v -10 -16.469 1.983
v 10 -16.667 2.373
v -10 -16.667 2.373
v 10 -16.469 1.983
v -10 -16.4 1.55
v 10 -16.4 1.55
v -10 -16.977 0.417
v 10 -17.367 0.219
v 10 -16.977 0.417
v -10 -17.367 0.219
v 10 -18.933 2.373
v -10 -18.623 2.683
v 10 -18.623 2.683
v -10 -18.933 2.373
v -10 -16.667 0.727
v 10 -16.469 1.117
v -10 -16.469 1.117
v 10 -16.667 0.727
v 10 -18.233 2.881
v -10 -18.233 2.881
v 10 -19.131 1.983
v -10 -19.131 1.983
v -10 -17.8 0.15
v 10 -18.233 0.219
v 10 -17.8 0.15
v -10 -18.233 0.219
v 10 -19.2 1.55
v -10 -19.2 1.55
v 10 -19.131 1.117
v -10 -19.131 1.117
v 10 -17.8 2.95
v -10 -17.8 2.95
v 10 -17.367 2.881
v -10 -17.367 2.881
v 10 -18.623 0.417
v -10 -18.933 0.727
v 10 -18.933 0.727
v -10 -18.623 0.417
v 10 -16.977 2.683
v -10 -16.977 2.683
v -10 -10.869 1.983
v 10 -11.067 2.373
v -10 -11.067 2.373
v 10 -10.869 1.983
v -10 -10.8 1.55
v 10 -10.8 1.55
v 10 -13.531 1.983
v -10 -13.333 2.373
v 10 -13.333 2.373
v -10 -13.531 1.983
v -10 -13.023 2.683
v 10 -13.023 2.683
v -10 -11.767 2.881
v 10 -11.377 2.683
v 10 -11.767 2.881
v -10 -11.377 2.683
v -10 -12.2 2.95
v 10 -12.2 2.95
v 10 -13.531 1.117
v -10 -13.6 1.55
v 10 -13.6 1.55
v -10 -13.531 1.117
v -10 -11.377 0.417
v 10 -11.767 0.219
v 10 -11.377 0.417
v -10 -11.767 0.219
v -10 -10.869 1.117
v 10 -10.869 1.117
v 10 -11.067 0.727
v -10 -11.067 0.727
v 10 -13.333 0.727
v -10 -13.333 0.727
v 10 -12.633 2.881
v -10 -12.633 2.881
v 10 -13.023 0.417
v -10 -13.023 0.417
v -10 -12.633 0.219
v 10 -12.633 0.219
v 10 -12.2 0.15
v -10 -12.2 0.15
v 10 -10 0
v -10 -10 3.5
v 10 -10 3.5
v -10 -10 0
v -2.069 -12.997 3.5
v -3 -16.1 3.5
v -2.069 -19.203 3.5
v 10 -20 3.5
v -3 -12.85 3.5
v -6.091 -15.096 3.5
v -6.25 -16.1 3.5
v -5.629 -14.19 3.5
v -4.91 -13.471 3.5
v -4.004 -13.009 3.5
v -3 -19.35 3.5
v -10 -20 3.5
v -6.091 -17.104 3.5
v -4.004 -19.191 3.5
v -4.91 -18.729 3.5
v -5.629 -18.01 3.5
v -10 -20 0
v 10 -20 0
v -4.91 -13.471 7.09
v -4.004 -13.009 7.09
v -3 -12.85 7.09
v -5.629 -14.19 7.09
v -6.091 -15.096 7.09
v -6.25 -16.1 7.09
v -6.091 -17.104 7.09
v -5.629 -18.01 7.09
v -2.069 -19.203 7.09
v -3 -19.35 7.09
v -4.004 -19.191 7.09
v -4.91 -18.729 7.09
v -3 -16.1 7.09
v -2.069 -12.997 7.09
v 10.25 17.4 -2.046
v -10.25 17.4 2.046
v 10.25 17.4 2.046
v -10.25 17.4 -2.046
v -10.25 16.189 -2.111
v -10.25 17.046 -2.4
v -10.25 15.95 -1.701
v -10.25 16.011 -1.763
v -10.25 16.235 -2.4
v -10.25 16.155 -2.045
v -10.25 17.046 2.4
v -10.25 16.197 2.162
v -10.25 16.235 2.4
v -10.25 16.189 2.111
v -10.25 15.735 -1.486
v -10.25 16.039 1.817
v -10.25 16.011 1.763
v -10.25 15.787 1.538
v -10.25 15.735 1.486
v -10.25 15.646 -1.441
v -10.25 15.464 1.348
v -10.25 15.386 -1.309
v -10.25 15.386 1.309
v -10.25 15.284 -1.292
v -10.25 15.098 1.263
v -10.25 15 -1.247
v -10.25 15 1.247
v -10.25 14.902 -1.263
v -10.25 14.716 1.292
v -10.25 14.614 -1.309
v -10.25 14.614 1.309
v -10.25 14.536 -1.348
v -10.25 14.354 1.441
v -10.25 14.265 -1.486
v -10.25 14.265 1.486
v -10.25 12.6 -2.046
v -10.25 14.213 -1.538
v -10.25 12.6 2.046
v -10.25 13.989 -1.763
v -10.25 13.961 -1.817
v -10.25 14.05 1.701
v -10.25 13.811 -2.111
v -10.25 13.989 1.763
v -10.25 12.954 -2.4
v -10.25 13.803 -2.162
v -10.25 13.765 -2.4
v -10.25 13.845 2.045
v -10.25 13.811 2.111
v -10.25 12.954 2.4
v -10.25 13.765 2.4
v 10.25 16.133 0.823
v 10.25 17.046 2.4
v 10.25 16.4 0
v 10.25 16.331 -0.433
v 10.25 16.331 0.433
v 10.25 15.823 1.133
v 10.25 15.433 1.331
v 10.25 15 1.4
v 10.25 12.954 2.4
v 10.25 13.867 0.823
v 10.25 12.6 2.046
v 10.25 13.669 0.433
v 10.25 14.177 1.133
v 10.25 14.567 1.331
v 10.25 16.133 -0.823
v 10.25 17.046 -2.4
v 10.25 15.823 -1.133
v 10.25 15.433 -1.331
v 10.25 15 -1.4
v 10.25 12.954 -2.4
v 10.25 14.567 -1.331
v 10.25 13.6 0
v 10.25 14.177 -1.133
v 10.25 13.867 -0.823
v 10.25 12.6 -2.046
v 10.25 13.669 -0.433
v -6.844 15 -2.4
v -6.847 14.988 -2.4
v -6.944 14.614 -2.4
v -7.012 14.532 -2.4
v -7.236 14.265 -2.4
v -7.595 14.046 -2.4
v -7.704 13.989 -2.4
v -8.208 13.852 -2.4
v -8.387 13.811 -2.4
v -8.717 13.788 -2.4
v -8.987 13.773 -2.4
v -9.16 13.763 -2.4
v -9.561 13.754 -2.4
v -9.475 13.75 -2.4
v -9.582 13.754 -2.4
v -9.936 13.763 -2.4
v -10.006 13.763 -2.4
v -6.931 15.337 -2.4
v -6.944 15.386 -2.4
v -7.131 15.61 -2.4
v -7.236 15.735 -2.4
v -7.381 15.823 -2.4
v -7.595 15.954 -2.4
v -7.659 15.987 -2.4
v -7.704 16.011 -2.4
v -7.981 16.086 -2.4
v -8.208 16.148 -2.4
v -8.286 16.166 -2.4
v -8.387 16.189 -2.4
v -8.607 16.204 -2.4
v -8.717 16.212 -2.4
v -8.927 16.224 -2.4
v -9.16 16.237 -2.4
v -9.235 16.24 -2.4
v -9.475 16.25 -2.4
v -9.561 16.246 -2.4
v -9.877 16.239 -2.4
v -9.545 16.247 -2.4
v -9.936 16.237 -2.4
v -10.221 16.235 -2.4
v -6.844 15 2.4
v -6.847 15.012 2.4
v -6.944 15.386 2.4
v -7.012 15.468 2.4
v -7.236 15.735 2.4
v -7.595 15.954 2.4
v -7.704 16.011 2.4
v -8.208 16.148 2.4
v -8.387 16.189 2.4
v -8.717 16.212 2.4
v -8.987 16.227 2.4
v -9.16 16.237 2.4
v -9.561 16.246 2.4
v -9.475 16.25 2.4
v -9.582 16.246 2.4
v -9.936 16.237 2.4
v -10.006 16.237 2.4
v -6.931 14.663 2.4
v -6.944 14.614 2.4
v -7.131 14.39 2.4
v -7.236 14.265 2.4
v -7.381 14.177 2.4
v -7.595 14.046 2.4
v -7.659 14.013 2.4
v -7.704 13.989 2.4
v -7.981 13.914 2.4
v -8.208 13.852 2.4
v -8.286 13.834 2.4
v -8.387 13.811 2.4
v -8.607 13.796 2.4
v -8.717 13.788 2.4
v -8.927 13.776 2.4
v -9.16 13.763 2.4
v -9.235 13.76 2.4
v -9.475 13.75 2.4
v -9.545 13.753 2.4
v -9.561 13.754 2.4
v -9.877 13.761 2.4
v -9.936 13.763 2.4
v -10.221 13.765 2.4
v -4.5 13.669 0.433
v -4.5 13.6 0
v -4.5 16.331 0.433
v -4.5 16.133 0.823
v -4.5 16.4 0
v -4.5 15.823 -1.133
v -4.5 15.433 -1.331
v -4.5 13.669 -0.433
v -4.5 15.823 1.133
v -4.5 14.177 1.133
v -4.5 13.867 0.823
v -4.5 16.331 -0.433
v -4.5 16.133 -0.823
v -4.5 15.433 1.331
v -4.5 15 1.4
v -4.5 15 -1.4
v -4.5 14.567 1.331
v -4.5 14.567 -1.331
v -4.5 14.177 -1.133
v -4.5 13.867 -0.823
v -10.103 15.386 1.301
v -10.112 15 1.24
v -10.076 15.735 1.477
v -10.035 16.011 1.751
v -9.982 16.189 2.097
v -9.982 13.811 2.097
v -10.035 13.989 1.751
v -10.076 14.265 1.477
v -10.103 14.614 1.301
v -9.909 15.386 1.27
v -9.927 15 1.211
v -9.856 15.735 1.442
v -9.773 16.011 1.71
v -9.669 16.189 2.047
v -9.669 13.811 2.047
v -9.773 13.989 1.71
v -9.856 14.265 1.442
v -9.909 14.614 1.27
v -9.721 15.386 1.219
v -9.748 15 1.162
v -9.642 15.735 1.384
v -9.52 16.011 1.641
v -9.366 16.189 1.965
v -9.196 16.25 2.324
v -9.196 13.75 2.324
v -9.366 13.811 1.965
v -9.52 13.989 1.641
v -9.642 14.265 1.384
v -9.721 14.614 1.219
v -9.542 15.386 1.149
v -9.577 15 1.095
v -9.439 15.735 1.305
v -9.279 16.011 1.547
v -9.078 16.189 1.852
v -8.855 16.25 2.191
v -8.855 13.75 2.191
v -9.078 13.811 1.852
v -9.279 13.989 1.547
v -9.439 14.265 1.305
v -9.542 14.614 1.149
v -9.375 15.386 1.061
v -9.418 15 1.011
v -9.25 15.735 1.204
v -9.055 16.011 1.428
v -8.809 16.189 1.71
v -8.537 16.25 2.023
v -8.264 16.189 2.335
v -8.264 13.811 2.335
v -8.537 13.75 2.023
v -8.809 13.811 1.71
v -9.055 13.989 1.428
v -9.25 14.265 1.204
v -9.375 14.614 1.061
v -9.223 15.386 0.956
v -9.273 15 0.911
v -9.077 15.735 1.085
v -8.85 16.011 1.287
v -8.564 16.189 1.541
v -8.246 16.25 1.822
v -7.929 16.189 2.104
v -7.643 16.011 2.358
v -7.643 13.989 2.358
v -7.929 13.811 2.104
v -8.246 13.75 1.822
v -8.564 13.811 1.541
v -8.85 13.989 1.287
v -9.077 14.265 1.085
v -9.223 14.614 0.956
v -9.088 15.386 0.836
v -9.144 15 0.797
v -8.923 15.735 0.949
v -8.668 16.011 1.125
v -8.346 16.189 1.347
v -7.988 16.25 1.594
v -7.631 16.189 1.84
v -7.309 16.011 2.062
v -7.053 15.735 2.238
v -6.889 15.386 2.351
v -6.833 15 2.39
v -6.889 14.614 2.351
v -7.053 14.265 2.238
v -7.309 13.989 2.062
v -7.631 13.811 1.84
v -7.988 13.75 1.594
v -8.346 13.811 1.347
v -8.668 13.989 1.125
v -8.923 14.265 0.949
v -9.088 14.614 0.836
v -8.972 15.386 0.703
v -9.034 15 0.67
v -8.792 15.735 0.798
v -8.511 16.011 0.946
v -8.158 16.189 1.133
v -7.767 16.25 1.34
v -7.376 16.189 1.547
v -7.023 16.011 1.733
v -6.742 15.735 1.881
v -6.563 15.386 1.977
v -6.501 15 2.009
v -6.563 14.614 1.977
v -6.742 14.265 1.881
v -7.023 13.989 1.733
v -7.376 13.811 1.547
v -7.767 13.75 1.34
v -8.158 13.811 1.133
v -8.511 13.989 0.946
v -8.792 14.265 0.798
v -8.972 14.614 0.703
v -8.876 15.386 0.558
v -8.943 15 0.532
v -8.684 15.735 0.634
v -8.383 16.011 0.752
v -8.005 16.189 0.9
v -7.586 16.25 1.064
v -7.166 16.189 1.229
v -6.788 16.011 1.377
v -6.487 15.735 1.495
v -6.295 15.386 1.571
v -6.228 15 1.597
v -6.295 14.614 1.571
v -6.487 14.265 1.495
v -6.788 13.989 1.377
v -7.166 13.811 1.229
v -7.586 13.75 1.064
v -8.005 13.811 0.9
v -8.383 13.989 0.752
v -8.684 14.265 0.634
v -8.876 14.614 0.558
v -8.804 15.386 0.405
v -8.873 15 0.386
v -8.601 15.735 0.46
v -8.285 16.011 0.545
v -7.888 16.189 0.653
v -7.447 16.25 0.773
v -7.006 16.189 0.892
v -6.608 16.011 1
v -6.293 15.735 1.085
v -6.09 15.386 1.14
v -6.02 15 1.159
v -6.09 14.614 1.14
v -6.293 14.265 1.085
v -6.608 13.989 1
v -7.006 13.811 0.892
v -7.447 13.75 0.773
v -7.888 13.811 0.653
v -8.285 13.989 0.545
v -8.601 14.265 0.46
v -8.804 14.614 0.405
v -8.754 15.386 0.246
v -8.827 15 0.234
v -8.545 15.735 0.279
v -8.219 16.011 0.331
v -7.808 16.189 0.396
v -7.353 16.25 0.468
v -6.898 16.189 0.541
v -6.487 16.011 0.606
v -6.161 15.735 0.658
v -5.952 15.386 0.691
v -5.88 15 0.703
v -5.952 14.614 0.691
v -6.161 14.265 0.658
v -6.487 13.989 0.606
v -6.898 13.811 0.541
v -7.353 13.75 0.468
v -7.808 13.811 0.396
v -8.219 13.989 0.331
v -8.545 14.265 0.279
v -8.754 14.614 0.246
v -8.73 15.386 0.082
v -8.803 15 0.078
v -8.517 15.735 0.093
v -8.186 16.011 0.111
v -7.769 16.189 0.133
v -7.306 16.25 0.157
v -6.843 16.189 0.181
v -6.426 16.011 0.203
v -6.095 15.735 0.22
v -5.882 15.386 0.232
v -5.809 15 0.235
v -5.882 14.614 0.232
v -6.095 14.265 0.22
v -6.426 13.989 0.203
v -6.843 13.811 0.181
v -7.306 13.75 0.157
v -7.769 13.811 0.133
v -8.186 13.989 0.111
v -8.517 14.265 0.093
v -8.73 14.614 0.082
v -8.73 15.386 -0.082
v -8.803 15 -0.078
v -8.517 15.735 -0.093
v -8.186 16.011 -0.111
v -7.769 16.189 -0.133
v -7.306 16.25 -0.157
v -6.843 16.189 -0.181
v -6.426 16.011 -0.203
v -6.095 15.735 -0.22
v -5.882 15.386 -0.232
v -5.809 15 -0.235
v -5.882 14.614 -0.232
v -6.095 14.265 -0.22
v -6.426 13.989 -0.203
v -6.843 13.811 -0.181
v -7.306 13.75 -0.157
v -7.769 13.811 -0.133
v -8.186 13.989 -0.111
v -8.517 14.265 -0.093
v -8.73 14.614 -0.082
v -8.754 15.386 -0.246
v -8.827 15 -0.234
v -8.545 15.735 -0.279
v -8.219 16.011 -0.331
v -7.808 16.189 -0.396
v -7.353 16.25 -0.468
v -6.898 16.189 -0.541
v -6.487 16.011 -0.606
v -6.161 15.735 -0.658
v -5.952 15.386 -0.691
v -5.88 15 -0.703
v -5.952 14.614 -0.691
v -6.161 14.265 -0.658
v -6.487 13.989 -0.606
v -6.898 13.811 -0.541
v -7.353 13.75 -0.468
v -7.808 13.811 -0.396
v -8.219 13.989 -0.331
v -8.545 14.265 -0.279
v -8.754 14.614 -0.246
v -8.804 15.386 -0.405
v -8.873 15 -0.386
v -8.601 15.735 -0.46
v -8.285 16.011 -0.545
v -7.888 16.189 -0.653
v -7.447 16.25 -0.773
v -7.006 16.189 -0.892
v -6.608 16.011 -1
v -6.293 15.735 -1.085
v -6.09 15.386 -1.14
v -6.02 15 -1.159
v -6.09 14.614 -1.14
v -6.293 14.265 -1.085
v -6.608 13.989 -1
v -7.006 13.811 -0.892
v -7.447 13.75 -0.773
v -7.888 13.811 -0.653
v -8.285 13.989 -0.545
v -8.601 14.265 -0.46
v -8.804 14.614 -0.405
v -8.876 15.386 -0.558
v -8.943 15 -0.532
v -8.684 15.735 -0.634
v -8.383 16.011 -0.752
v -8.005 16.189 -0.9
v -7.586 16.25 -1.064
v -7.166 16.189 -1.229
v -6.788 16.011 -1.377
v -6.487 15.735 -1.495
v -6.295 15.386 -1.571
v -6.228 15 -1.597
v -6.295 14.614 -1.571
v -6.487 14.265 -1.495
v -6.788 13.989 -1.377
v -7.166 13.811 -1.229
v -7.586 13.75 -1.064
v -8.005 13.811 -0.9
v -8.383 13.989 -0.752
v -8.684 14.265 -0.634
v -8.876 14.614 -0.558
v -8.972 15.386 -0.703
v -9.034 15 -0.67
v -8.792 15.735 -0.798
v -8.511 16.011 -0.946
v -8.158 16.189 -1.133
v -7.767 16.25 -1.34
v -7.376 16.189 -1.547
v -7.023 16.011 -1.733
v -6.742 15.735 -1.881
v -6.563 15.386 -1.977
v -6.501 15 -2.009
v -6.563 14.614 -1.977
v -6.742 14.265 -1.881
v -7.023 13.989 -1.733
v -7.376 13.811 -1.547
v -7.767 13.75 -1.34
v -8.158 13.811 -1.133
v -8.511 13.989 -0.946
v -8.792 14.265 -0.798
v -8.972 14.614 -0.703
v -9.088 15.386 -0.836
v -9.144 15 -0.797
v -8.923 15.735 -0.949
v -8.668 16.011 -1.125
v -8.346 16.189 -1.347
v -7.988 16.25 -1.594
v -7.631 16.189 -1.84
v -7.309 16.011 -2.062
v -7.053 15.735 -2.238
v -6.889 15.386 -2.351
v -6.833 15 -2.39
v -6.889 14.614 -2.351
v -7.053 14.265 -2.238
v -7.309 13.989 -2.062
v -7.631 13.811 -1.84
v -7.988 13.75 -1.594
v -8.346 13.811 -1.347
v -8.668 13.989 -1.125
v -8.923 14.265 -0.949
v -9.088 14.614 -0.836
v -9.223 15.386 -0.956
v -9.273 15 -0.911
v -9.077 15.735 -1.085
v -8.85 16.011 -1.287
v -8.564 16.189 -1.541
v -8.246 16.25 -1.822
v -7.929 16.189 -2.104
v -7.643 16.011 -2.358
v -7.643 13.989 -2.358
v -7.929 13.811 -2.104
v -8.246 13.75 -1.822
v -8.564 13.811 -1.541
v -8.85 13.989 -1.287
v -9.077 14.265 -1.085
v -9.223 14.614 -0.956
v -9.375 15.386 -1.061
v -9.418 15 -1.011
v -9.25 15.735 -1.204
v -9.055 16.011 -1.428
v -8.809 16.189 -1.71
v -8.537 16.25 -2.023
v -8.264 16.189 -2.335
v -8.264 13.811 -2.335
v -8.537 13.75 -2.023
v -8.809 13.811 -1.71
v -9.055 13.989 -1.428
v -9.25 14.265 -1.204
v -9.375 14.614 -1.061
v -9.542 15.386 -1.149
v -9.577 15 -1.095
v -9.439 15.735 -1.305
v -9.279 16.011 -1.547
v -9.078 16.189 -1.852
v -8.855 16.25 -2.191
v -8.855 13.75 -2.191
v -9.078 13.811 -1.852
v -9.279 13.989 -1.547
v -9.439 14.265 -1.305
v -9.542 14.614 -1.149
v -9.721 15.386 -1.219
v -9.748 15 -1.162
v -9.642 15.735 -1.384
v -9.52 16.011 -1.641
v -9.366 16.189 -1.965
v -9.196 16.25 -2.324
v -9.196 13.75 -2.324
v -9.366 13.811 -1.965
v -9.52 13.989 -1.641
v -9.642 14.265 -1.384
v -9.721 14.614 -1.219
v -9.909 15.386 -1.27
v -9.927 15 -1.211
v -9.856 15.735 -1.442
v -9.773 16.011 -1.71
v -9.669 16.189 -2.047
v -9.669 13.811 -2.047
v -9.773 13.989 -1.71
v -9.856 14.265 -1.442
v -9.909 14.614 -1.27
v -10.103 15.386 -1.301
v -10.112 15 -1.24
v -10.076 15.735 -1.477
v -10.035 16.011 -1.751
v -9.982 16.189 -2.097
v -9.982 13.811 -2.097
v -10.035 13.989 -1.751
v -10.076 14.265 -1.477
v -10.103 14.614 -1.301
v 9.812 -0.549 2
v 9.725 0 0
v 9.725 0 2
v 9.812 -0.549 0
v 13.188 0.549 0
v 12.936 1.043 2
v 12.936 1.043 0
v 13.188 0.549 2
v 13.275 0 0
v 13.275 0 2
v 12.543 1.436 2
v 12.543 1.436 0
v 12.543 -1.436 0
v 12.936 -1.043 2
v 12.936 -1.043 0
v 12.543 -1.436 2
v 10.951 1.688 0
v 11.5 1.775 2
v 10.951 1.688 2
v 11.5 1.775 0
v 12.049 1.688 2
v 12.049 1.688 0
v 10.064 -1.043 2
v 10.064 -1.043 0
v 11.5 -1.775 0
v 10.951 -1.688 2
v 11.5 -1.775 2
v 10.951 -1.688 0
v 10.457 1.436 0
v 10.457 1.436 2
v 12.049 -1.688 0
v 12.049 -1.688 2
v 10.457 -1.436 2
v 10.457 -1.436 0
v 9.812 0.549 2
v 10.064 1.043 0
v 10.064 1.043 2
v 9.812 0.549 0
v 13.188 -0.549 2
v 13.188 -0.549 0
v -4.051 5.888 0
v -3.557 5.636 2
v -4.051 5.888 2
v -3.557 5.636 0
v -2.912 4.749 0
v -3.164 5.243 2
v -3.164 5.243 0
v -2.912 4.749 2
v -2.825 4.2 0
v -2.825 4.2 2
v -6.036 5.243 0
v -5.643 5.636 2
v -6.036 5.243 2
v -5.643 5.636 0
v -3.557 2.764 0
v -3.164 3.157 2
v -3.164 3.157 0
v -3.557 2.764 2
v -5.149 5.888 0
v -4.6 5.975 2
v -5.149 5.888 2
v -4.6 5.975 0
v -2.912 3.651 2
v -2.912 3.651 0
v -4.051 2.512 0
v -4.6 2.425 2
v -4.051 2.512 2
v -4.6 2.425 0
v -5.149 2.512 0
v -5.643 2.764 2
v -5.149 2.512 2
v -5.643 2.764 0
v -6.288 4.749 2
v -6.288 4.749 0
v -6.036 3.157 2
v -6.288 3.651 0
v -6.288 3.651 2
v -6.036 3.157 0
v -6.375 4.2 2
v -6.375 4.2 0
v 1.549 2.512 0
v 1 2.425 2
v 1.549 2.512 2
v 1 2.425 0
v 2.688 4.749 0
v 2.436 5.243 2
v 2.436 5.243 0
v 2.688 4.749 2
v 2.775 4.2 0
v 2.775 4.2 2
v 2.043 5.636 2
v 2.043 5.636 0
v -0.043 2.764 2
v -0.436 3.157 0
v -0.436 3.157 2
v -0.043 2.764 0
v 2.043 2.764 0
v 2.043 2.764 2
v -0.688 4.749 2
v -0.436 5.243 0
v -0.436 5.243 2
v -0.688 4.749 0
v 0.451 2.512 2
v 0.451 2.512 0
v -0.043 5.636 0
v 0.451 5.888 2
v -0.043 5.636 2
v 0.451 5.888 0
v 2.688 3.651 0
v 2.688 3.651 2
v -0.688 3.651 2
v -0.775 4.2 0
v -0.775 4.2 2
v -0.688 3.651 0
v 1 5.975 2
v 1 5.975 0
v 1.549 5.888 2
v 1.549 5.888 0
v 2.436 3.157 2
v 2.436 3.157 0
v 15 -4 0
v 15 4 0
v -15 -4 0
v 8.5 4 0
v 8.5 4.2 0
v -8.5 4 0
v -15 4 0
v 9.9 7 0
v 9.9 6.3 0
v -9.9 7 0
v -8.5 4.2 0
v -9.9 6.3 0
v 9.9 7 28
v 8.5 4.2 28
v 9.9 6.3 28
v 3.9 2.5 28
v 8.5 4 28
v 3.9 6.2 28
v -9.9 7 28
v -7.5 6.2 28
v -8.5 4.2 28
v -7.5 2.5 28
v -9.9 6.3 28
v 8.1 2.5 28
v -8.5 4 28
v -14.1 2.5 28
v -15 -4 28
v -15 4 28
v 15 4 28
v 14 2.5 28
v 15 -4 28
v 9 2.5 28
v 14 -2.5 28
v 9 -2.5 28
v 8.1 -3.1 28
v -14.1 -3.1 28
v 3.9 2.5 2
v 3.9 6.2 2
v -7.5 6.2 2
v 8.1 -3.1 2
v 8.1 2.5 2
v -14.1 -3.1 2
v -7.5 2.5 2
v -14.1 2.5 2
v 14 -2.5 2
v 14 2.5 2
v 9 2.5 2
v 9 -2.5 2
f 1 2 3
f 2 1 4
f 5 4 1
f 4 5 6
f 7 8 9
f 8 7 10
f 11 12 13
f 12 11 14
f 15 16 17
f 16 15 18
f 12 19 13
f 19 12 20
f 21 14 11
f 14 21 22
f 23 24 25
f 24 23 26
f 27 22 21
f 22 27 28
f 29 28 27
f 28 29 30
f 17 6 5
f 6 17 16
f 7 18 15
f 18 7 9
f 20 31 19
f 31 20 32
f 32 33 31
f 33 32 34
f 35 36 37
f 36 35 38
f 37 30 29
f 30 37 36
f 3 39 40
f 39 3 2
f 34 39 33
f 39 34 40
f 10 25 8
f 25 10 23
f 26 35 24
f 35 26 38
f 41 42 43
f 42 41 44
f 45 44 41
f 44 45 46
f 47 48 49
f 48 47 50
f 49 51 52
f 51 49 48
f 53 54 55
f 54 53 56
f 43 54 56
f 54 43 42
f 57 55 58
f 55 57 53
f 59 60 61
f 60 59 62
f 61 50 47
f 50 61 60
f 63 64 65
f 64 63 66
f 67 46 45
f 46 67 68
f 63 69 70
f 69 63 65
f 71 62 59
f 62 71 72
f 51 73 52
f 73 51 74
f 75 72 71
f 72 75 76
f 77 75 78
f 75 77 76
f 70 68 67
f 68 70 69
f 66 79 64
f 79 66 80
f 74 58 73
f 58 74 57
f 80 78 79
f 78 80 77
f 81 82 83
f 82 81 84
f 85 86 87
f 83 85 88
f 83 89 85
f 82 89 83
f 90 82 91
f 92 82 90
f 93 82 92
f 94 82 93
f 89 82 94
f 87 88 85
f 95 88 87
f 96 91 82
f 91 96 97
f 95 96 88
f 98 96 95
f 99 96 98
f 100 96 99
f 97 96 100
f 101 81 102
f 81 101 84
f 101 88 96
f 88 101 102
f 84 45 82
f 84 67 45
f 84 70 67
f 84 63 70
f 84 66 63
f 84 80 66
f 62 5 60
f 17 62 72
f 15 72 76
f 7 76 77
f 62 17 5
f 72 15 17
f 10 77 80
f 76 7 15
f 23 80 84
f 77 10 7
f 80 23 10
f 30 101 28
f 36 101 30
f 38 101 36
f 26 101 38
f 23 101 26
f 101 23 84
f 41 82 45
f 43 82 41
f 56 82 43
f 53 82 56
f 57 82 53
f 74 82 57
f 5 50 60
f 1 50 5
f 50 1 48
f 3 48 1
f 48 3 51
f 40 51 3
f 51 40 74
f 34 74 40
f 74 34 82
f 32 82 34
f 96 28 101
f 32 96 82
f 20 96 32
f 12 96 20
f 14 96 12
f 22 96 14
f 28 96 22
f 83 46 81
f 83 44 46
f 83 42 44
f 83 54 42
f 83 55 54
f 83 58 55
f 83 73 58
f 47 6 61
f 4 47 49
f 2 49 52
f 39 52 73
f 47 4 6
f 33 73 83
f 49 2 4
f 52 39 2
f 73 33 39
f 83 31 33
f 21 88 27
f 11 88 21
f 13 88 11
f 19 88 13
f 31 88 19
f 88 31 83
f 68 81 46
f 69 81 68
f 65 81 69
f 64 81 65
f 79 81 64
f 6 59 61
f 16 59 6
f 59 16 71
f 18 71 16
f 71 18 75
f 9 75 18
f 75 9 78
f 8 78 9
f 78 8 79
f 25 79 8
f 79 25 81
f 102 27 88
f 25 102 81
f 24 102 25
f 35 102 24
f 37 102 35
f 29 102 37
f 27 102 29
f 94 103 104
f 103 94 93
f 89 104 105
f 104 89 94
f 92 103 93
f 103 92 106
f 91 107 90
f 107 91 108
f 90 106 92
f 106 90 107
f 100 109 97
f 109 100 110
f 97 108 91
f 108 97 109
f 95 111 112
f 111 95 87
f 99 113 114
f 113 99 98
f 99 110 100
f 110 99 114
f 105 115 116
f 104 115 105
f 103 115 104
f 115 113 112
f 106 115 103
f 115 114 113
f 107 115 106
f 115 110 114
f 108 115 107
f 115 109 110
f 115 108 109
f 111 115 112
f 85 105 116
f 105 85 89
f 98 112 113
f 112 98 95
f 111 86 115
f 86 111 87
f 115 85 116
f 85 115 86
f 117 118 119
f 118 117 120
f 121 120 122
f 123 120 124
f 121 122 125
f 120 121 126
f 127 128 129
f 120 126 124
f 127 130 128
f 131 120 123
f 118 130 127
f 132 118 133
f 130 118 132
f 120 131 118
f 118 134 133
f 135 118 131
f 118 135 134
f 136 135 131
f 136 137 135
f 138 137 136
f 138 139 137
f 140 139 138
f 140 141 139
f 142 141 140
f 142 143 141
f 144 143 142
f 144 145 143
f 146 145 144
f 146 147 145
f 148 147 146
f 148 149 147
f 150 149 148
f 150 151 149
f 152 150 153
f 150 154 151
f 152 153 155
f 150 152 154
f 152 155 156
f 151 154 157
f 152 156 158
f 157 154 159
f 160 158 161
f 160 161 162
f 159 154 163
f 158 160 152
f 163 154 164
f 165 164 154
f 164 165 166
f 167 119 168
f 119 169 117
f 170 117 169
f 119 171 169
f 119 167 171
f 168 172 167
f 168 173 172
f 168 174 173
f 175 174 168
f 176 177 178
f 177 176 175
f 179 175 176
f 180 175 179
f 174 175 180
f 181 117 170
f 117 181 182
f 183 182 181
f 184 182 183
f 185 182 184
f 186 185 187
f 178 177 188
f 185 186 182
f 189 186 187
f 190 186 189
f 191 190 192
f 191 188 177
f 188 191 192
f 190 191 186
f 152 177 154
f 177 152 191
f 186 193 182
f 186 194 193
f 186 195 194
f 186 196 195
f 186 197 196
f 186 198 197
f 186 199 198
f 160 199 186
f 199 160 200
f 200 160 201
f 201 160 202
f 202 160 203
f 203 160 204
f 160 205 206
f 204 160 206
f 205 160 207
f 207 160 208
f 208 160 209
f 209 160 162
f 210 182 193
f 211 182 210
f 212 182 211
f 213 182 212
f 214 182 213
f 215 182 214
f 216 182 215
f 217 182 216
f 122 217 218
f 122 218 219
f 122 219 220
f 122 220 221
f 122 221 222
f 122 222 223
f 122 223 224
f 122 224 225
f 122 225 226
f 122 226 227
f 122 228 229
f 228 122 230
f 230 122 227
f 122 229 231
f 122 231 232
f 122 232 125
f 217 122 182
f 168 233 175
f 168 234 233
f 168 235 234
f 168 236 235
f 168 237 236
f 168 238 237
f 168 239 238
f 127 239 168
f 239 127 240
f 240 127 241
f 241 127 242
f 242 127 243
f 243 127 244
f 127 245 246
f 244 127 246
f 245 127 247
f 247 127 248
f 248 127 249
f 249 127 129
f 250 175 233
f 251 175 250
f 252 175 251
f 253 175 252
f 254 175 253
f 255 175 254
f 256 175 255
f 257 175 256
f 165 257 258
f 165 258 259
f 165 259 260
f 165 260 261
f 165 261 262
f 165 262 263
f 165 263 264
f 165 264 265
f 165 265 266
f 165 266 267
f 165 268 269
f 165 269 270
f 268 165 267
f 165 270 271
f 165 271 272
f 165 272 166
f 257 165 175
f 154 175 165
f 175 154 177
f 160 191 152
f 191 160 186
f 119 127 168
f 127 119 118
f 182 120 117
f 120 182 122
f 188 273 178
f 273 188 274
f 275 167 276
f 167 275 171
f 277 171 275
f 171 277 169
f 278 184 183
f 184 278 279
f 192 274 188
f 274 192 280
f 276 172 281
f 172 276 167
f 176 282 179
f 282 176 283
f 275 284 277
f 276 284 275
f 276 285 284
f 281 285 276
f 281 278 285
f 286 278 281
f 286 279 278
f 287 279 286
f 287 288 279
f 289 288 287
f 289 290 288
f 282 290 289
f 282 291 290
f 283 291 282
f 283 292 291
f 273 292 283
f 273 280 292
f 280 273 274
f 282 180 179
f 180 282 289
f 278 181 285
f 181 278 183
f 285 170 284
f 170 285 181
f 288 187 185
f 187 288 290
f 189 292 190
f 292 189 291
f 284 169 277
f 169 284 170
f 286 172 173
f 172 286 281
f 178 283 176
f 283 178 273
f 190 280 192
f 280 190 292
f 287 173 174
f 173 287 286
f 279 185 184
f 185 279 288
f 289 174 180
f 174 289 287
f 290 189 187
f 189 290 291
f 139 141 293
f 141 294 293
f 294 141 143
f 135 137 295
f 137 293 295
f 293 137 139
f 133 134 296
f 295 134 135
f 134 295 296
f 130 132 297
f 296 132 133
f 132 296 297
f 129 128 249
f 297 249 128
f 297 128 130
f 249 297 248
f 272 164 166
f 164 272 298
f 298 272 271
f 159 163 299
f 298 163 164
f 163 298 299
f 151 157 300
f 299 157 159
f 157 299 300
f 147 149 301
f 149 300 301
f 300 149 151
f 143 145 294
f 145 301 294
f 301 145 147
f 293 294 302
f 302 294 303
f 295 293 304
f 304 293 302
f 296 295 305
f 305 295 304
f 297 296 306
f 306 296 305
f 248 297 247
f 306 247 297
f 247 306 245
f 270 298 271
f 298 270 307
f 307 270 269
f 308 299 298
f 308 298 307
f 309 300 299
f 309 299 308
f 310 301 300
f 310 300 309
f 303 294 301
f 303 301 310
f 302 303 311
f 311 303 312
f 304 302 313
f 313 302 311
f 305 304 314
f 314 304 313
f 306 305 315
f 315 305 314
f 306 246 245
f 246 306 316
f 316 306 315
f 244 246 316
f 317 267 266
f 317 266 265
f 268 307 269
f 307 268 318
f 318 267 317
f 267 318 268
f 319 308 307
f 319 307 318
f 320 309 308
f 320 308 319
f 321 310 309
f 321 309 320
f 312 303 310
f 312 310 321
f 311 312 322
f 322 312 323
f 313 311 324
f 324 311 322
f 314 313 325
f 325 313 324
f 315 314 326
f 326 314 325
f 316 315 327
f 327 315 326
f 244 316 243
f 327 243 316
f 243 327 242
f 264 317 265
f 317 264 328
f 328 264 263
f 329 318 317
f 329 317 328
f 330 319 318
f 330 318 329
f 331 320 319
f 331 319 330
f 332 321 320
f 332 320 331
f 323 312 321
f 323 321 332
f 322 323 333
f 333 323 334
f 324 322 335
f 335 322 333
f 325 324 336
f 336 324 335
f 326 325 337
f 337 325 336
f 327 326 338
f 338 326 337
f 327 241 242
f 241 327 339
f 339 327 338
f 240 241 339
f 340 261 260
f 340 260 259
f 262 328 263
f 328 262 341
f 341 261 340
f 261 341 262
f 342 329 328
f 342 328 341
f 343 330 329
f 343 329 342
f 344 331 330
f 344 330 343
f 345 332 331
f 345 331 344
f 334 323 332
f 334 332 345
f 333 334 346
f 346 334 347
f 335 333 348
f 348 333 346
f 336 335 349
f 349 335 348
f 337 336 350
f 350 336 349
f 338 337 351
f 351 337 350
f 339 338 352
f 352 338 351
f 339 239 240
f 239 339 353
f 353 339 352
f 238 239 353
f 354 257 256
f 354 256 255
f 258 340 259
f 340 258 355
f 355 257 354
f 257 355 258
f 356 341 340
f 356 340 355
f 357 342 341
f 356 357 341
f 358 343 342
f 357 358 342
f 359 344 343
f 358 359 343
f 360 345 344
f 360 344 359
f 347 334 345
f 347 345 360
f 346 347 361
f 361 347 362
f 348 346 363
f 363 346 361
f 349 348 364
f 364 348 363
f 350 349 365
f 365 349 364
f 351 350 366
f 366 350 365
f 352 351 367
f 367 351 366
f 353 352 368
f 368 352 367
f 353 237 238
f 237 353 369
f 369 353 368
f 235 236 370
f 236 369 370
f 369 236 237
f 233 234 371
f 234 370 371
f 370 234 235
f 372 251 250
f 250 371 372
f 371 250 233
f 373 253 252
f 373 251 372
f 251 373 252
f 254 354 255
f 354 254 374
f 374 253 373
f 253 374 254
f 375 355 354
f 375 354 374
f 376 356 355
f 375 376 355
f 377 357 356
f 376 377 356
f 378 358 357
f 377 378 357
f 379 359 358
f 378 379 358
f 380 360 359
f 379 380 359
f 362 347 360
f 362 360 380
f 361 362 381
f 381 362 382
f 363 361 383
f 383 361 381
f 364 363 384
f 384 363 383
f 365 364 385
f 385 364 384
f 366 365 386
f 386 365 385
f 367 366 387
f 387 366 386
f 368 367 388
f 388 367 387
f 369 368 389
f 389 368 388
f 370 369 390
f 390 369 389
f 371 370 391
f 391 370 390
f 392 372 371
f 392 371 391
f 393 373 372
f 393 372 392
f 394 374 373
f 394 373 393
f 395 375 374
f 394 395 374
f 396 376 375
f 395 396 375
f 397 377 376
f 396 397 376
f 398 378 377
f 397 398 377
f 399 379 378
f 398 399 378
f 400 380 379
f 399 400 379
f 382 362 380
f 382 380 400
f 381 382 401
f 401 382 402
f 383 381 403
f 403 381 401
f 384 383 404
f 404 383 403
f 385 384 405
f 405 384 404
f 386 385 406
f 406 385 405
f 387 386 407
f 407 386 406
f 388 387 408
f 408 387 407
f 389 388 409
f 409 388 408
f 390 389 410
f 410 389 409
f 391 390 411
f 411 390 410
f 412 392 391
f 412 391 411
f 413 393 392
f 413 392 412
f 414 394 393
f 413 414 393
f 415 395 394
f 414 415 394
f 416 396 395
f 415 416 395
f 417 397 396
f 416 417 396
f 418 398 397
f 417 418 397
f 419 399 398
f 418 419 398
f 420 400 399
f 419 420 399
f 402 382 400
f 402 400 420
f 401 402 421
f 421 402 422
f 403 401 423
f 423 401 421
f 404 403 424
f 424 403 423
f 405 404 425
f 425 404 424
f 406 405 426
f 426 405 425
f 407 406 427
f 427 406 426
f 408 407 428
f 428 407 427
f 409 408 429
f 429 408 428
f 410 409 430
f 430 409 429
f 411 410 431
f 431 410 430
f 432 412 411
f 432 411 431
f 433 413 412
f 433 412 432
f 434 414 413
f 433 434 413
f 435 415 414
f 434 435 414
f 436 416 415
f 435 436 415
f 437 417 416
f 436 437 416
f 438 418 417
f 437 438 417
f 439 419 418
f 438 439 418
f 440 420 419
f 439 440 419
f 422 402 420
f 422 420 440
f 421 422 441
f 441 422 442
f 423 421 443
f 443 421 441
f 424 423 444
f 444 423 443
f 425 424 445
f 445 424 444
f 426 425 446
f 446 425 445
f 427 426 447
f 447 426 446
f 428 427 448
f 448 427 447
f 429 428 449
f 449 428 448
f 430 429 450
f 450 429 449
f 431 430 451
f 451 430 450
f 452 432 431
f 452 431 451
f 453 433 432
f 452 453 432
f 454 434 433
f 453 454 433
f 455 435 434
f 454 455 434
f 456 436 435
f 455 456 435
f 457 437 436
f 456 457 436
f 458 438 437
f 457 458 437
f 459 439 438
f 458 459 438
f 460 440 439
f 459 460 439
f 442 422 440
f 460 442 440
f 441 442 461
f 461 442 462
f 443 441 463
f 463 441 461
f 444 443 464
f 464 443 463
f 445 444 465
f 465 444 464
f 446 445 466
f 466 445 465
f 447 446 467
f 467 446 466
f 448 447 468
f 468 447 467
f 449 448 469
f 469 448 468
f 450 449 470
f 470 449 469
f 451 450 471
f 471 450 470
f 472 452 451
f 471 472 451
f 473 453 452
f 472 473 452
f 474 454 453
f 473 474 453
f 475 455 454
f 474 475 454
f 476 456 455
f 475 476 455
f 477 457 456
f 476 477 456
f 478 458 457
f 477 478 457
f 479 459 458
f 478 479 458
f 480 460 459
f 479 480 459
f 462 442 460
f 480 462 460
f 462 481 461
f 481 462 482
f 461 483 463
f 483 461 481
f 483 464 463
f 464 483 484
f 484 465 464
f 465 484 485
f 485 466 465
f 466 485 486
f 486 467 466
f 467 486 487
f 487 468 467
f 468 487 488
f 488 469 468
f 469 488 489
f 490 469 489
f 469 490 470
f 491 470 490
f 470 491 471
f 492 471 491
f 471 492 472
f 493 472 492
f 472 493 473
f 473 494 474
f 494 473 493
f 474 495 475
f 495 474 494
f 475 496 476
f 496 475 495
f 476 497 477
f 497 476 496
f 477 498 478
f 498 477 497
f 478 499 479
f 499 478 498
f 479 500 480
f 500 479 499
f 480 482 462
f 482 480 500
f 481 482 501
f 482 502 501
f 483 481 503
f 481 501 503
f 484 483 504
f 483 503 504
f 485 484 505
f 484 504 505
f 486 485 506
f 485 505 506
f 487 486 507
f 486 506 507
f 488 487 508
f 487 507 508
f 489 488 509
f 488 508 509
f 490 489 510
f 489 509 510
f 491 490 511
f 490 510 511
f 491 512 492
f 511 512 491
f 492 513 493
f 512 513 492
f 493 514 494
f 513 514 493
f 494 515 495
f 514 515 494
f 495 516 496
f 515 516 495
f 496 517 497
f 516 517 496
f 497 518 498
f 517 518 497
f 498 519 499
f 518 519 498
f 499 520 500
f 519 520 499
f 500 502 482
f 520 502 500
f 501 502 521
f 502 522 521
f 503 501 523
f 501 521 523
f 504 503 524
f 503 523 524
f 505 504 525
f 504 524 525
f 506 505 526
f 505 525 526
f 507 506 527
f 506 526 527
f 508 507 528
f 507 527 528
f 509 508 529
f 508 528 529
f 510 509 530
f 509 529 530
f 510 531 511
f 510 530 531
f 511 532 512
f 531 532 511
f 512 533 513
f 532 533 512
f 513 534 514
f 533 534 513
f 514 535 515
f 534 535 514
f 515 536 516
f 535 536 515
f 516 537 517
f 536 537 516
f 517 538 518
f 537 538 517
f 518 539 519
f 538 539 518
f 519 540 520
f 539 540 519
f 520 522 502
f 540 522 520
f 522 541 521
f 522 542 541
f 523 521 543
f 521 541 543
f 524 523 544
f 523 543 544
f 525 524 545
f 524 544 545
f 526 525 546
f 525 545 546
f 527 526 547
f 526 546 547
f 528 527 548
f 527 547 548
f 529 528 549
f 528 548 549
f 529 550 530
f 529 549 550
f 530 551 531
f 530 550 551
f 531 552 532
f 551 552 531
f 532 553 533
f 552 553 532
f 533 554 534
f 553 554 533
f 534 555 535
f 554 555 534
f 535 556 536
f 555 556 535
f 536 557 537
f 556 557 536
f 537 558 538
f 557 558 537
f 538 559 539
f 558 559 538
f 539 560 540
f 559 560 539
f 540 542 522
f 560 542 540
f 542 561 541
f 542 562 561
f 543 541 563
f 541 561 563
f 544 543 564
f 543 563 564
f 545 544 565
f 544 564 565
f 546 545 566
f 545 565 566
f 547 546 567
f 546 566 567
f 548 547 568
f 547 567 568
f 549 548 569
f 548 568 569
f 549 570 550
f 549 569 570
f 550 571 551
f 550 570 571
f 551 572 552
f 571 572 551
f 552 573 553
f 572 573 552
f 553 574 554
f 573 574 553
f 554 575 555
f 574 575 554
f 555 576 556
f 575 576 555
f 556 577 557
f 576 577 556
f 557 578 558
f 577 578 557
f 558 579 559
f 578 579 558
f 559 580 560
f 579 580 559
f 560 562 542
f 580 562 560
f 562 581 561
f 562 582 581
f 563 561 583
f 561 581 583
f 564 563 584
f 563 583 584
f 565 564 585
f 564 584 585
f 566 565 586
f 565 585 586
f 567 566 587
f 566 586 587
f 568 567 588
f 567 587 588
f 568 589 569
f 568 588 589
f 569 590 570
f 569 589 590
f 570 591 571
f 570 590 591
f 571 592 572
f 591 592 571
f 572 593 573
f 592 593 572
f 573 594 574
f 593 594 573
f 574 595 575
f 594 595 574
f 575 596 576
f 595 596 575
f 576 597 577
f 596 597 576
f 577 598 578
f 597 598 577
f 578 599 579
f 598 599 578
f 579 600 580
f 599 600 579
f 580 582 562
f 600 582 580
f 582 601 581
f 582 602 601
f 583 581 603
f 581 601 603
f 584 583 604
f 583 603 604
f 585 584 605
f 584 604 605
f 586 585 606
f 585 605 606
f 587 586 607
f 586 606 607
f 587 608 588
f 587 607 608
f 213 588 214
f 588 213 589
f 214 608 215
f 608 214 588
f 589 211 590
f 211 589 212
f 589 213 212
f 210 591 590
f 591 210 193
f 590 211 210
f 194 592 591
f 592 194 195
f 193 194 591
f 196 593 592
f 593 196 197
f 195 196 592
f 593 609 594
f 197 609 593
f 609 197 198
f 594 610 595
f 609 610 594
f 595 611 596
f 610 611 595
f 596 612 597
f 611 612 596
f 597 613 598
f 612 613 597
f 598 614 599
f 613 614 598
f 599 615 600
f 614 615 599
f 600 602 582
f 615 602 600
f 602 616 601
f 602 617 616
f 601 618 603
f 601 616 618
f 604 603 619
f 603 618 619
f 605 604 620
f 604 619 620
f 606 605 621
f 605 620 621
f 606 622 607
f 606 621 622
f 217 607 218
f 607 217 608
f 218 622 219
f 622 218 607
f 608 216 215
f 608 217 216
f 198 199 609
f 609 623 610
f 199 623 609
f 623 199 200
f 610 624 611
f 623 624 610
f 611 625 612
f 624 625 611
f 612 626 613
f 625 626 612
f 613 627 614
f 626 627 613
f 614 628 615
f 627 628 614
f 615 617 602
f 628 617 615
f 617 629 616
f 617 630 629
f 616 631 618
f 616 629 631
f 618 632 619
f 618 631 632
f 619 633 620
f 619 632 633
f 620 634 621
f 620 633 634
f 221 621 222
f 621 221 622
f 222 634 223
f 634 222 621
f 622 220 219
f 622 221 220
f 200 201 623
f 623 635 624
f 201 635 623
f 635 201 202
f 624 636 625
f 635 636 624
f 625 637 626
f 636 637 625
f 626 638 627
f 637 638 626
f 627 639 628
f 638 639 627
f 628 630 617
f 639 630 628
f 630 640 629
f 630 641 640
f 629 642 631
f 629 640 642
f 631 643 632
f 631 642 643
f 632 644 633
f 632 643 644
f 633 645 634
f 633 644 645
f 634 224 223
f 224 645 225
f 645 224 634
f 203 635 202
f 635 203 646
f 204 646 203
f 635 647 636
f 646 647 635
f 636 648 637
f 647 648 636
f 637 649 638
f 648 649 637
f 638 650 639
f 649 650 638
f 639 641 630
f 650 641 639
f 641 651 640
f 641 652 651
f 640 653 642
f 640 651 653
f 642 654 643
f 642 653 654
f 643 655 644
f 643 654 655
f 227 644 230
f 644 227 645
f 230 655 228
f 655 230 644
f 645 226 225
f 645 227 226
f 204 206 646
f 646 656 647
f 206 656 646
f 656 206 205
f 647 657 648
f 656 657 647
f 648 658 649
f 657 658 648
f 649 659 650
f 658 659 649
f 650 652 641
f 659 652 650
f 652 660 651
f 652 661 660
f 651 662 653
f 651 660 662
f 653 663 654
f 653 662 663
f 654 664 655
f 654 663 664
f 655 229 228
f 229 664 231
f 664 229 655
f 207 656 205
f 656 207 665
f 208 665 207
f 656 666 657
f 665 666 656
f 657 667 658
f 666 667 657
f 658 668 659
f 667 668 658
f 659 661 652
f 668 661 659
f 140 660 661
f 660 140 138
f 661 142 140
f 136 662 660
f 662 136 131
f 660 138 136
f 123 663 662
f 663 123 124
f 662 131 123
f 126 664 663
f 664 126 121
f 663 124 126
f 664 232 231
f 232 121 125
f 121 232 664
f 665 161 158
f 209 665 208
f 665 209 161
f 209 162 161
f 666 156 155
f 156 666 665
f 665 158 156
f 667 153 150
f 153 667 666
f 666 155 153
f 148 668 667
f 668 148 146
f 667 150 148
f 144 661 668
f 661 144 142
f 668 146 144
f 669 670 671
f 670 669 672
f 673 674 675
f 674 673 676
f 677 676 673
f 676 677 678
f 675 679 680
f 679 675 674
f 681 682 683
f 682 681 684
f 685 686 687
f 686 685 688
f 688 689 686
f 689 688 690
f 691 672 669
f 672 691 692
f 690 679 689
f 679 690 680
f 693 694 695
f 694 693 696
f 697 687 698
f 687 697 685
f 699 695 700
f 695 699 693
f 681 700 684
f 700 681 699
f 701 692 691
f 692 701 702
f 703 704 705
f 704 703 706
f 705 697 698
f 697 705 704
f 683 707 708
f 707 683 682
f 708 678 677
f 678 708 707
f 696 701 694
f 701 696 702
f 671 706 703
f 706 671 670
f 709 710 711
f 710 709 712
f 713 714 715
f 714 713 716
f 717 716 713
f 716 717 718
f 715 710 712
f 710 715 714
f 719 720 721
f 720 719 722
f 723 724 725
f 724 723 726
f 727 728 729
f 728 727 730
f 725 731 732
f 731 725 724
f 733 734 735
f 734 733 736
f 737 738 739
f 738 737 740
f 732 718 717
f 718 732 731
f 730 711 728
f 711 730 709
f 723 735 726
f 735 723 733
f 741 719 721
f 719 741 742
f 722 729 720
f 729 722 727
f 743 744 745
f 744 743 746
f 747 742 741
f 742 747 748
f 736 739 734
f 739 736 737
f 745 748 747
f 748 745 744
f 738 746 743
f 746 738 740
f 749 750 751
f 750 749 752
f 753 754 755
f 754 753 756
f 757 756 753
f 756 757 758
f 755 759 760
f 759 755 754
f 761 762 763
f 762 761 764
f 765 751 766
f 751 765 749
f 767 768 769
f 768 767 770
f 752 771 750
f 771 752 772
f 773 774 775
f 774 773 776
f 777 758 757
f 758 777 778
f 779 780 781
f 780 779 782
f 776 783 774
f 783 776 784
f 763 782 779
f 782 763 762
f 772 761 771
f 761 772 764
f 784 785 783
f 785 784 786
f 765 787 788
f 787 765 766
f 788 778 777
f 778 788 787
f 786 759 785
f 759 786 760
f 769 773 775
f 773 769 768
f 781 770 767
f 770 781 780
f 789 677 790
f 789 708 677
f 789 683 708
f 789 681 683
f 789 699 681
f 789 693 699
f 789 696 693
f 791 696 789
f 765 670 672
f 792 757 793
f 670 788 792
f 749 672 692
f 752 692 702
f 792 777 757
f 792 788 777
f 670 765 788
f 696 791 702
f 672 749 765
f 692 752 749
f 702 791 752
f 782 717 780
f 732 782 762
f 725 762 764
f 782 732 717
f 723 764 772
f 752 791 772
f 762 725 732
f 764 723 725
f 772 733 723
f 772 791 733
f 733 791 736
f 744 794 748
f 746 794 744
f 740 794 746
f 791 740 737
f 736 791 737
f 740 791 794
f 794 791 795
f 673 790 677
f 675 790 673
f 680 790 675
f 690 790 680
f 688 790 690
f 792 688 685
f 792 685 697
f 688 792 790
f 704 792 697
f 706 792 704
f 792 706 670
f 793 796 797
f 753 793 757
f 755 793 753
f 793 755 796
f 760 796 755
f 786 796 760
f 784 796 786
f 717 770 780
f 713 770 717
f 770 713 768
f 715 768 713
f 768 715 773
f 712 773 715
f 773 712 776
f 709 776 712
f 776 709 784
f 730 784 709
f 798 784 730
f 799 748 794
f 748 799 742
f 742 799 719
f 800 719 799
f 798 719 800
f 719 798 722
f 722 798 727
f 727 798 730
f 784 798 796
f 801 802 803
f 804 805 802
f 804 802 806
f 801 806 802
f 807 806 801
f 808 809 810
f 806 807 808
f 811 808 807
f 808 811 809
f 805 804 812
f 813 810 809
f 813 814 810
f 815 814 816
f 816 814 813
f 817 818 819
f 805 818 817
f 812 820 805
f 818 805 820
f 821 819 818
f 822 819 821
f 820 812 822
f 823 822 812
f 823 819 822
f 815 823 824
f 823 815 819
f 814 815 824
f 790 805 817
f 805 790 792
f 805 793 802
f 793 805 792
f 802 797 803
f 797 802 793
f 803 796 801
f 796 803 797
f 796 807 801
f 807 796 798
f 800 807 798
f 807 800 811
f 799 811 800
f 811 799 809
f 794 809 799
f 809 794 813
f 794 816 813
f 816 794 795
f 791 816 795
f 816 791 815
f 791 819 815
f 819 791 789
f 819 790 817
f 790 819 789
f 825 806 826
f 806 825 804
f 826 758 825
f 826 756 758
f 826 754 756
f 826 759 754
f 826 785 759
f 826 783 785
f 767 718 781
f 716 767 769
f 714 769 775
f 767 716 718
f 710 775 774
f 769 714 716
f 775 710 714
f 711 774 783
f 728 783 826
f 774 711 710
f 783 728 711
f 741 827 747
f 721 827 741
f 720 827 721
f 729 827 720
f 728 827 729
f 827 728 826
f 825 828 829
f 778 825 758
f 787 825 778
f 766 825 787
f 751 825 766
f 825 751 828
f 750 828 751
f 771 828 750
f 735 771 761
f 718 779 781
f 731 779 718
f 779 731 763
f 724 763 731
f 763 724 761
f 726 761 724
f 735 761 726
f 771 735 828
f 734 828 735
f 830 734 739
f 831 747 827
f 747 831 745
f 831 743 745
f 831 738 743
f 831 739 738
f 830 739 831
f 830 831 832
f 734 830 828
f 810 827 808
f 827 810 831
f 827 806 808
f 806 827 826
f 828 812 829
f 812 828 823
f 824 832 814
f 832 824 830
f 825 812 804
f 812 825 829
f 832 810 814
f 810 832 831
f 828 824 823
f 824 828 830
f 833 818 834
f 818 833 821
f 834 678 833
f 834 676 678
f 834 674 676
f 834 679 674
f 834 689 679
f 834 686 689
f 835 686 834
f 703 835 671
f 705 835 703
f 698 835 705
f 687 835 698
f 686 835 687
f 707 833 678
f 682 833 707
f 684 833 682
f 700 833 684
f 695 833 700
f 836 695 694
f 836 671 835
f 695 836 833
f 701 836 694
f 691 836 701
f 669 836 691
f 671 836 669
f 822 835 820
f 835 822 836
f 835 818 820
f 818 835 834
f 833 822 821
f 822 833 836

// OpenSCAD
// parts for flexible-flyer parametric variant of Phoenix Reborn

slide_clearance=0.2;

//%translate ([0,0,-16]) import("gripper_box_left.stl", convexity=10);

screw_thread_dia=2.8; // seems to work for m3
screw_clearance_dia=screw_thread_dia+0.5;
    screw_head_dia=5.5; // m3 screw
screw_head_clearance=1.0; // minimum distance of screw heads above slider rail

module slide(grow) {
    // make a scalable slide profile, inset by the specified amount for clearance
    union() {
        hull() {
            translate([0,6.65]) square([20+grow,0.70], center=true);
            translate([0,4.3]) square([17+grow,0.5], center=true);
        }
        translate([0,4.5]) square([17,5], center=true);
    }
}

module box() {
    cl=slide_clearance/global_scale;
    difference() {
        linear_extrude(height=28) union() {
          square([30,8], center=true);
          slide(grow=-cl);
        };
        whip_box_x=11.2+cl;
        whip_box_y=5;
        
        translate([-1.8,6.0-whip_box_y/2+cl,22]) 
            cube([whip_box_x,whip_box_y,40], center=true);


        piv_box_x=22.0+cl;
        piv_box_y=5.4+cl;
        
        translate([-3,2.5-piv_box_y/2,22]) 
            cube([piv_box_x,piv_box_y,40], center=true);
        
        thumb_pin=4.8+cl;
        translate([11.5,0,22]) 
            cube([thumb_pin,thumb_pin,40], center=true);
        
        
        for(dx=[[11.5,0,0],[-4.6,4.2,0],[1,4.2,0]]) translate(dx)
            cylinder(d=screw_clearance_dia/global_scale+.25, h=40, $fn=20, center=true); 
    }
}

module thumb_tensioner() {
    // translate([-15.0,69.8,-25.5]) import("thumb_v2_tensioner_pin.stl", convexity=10);
    difference() {
        rotate([-90,0,0]) intersection() {
            cube([4.8,4.8,20.5], center=true);
            rotate(45) cube([4.8*sqrt(2)-0.5, 4.8*sqrt(2)-0.5, 45], center=true);
        }
        translate([0,-3,0])
            rotate([90,0,0]) 
                cylinder(d=screw_thread_dia/global_scale, h=15, center=true, $fn=20);
        // translate([0,8,0]) cylinder(d=2, h=15, center=true, $fn=20);
        translate([0,10.3,0]) scale([1,1.2,1])
            rotate([0,90,0]) rotate_extrude(angle=180, convexity=10, $fn=50) 
                translate([-2.5,0]) circle(d=2.5, $fn=20);
    }
            
}

module pivot() {
    *translate([-5.1,-10,2]) 
        rotate([0,90,0]) import("swivel_pin_left_JD1.stl", convexity=10);
    translate([0,0,1.55]) {
        difference() {
            translate([0,0,0.2]) cube([10,20,3.5], center=true);
            for(dx=[-2.8,2.8]) translate([dx,0,0]) rotate([90,0,0]) 
                cylinder(d=screw_thread_dia/global_scale, h=50, center=true, $fn=20);
        }
        translate([-1.1,3,1.94]) difference() {
            cylinder(d=6.5, h=3.6, $fn=20);
            scale([1,0.3,1]) translate([0, -10*sqrt(2)/2,0]) rotate(45) cube([10,10,12], center=true);
        }
    }
}

global_scale=1.;

scale(global_scale) translate([0,-15,0]) rotate(90) pivot();

scale(global_scale) translate([0,15,0]) rotate(90) thumb_tensioner();

scale(global_scale) box();
